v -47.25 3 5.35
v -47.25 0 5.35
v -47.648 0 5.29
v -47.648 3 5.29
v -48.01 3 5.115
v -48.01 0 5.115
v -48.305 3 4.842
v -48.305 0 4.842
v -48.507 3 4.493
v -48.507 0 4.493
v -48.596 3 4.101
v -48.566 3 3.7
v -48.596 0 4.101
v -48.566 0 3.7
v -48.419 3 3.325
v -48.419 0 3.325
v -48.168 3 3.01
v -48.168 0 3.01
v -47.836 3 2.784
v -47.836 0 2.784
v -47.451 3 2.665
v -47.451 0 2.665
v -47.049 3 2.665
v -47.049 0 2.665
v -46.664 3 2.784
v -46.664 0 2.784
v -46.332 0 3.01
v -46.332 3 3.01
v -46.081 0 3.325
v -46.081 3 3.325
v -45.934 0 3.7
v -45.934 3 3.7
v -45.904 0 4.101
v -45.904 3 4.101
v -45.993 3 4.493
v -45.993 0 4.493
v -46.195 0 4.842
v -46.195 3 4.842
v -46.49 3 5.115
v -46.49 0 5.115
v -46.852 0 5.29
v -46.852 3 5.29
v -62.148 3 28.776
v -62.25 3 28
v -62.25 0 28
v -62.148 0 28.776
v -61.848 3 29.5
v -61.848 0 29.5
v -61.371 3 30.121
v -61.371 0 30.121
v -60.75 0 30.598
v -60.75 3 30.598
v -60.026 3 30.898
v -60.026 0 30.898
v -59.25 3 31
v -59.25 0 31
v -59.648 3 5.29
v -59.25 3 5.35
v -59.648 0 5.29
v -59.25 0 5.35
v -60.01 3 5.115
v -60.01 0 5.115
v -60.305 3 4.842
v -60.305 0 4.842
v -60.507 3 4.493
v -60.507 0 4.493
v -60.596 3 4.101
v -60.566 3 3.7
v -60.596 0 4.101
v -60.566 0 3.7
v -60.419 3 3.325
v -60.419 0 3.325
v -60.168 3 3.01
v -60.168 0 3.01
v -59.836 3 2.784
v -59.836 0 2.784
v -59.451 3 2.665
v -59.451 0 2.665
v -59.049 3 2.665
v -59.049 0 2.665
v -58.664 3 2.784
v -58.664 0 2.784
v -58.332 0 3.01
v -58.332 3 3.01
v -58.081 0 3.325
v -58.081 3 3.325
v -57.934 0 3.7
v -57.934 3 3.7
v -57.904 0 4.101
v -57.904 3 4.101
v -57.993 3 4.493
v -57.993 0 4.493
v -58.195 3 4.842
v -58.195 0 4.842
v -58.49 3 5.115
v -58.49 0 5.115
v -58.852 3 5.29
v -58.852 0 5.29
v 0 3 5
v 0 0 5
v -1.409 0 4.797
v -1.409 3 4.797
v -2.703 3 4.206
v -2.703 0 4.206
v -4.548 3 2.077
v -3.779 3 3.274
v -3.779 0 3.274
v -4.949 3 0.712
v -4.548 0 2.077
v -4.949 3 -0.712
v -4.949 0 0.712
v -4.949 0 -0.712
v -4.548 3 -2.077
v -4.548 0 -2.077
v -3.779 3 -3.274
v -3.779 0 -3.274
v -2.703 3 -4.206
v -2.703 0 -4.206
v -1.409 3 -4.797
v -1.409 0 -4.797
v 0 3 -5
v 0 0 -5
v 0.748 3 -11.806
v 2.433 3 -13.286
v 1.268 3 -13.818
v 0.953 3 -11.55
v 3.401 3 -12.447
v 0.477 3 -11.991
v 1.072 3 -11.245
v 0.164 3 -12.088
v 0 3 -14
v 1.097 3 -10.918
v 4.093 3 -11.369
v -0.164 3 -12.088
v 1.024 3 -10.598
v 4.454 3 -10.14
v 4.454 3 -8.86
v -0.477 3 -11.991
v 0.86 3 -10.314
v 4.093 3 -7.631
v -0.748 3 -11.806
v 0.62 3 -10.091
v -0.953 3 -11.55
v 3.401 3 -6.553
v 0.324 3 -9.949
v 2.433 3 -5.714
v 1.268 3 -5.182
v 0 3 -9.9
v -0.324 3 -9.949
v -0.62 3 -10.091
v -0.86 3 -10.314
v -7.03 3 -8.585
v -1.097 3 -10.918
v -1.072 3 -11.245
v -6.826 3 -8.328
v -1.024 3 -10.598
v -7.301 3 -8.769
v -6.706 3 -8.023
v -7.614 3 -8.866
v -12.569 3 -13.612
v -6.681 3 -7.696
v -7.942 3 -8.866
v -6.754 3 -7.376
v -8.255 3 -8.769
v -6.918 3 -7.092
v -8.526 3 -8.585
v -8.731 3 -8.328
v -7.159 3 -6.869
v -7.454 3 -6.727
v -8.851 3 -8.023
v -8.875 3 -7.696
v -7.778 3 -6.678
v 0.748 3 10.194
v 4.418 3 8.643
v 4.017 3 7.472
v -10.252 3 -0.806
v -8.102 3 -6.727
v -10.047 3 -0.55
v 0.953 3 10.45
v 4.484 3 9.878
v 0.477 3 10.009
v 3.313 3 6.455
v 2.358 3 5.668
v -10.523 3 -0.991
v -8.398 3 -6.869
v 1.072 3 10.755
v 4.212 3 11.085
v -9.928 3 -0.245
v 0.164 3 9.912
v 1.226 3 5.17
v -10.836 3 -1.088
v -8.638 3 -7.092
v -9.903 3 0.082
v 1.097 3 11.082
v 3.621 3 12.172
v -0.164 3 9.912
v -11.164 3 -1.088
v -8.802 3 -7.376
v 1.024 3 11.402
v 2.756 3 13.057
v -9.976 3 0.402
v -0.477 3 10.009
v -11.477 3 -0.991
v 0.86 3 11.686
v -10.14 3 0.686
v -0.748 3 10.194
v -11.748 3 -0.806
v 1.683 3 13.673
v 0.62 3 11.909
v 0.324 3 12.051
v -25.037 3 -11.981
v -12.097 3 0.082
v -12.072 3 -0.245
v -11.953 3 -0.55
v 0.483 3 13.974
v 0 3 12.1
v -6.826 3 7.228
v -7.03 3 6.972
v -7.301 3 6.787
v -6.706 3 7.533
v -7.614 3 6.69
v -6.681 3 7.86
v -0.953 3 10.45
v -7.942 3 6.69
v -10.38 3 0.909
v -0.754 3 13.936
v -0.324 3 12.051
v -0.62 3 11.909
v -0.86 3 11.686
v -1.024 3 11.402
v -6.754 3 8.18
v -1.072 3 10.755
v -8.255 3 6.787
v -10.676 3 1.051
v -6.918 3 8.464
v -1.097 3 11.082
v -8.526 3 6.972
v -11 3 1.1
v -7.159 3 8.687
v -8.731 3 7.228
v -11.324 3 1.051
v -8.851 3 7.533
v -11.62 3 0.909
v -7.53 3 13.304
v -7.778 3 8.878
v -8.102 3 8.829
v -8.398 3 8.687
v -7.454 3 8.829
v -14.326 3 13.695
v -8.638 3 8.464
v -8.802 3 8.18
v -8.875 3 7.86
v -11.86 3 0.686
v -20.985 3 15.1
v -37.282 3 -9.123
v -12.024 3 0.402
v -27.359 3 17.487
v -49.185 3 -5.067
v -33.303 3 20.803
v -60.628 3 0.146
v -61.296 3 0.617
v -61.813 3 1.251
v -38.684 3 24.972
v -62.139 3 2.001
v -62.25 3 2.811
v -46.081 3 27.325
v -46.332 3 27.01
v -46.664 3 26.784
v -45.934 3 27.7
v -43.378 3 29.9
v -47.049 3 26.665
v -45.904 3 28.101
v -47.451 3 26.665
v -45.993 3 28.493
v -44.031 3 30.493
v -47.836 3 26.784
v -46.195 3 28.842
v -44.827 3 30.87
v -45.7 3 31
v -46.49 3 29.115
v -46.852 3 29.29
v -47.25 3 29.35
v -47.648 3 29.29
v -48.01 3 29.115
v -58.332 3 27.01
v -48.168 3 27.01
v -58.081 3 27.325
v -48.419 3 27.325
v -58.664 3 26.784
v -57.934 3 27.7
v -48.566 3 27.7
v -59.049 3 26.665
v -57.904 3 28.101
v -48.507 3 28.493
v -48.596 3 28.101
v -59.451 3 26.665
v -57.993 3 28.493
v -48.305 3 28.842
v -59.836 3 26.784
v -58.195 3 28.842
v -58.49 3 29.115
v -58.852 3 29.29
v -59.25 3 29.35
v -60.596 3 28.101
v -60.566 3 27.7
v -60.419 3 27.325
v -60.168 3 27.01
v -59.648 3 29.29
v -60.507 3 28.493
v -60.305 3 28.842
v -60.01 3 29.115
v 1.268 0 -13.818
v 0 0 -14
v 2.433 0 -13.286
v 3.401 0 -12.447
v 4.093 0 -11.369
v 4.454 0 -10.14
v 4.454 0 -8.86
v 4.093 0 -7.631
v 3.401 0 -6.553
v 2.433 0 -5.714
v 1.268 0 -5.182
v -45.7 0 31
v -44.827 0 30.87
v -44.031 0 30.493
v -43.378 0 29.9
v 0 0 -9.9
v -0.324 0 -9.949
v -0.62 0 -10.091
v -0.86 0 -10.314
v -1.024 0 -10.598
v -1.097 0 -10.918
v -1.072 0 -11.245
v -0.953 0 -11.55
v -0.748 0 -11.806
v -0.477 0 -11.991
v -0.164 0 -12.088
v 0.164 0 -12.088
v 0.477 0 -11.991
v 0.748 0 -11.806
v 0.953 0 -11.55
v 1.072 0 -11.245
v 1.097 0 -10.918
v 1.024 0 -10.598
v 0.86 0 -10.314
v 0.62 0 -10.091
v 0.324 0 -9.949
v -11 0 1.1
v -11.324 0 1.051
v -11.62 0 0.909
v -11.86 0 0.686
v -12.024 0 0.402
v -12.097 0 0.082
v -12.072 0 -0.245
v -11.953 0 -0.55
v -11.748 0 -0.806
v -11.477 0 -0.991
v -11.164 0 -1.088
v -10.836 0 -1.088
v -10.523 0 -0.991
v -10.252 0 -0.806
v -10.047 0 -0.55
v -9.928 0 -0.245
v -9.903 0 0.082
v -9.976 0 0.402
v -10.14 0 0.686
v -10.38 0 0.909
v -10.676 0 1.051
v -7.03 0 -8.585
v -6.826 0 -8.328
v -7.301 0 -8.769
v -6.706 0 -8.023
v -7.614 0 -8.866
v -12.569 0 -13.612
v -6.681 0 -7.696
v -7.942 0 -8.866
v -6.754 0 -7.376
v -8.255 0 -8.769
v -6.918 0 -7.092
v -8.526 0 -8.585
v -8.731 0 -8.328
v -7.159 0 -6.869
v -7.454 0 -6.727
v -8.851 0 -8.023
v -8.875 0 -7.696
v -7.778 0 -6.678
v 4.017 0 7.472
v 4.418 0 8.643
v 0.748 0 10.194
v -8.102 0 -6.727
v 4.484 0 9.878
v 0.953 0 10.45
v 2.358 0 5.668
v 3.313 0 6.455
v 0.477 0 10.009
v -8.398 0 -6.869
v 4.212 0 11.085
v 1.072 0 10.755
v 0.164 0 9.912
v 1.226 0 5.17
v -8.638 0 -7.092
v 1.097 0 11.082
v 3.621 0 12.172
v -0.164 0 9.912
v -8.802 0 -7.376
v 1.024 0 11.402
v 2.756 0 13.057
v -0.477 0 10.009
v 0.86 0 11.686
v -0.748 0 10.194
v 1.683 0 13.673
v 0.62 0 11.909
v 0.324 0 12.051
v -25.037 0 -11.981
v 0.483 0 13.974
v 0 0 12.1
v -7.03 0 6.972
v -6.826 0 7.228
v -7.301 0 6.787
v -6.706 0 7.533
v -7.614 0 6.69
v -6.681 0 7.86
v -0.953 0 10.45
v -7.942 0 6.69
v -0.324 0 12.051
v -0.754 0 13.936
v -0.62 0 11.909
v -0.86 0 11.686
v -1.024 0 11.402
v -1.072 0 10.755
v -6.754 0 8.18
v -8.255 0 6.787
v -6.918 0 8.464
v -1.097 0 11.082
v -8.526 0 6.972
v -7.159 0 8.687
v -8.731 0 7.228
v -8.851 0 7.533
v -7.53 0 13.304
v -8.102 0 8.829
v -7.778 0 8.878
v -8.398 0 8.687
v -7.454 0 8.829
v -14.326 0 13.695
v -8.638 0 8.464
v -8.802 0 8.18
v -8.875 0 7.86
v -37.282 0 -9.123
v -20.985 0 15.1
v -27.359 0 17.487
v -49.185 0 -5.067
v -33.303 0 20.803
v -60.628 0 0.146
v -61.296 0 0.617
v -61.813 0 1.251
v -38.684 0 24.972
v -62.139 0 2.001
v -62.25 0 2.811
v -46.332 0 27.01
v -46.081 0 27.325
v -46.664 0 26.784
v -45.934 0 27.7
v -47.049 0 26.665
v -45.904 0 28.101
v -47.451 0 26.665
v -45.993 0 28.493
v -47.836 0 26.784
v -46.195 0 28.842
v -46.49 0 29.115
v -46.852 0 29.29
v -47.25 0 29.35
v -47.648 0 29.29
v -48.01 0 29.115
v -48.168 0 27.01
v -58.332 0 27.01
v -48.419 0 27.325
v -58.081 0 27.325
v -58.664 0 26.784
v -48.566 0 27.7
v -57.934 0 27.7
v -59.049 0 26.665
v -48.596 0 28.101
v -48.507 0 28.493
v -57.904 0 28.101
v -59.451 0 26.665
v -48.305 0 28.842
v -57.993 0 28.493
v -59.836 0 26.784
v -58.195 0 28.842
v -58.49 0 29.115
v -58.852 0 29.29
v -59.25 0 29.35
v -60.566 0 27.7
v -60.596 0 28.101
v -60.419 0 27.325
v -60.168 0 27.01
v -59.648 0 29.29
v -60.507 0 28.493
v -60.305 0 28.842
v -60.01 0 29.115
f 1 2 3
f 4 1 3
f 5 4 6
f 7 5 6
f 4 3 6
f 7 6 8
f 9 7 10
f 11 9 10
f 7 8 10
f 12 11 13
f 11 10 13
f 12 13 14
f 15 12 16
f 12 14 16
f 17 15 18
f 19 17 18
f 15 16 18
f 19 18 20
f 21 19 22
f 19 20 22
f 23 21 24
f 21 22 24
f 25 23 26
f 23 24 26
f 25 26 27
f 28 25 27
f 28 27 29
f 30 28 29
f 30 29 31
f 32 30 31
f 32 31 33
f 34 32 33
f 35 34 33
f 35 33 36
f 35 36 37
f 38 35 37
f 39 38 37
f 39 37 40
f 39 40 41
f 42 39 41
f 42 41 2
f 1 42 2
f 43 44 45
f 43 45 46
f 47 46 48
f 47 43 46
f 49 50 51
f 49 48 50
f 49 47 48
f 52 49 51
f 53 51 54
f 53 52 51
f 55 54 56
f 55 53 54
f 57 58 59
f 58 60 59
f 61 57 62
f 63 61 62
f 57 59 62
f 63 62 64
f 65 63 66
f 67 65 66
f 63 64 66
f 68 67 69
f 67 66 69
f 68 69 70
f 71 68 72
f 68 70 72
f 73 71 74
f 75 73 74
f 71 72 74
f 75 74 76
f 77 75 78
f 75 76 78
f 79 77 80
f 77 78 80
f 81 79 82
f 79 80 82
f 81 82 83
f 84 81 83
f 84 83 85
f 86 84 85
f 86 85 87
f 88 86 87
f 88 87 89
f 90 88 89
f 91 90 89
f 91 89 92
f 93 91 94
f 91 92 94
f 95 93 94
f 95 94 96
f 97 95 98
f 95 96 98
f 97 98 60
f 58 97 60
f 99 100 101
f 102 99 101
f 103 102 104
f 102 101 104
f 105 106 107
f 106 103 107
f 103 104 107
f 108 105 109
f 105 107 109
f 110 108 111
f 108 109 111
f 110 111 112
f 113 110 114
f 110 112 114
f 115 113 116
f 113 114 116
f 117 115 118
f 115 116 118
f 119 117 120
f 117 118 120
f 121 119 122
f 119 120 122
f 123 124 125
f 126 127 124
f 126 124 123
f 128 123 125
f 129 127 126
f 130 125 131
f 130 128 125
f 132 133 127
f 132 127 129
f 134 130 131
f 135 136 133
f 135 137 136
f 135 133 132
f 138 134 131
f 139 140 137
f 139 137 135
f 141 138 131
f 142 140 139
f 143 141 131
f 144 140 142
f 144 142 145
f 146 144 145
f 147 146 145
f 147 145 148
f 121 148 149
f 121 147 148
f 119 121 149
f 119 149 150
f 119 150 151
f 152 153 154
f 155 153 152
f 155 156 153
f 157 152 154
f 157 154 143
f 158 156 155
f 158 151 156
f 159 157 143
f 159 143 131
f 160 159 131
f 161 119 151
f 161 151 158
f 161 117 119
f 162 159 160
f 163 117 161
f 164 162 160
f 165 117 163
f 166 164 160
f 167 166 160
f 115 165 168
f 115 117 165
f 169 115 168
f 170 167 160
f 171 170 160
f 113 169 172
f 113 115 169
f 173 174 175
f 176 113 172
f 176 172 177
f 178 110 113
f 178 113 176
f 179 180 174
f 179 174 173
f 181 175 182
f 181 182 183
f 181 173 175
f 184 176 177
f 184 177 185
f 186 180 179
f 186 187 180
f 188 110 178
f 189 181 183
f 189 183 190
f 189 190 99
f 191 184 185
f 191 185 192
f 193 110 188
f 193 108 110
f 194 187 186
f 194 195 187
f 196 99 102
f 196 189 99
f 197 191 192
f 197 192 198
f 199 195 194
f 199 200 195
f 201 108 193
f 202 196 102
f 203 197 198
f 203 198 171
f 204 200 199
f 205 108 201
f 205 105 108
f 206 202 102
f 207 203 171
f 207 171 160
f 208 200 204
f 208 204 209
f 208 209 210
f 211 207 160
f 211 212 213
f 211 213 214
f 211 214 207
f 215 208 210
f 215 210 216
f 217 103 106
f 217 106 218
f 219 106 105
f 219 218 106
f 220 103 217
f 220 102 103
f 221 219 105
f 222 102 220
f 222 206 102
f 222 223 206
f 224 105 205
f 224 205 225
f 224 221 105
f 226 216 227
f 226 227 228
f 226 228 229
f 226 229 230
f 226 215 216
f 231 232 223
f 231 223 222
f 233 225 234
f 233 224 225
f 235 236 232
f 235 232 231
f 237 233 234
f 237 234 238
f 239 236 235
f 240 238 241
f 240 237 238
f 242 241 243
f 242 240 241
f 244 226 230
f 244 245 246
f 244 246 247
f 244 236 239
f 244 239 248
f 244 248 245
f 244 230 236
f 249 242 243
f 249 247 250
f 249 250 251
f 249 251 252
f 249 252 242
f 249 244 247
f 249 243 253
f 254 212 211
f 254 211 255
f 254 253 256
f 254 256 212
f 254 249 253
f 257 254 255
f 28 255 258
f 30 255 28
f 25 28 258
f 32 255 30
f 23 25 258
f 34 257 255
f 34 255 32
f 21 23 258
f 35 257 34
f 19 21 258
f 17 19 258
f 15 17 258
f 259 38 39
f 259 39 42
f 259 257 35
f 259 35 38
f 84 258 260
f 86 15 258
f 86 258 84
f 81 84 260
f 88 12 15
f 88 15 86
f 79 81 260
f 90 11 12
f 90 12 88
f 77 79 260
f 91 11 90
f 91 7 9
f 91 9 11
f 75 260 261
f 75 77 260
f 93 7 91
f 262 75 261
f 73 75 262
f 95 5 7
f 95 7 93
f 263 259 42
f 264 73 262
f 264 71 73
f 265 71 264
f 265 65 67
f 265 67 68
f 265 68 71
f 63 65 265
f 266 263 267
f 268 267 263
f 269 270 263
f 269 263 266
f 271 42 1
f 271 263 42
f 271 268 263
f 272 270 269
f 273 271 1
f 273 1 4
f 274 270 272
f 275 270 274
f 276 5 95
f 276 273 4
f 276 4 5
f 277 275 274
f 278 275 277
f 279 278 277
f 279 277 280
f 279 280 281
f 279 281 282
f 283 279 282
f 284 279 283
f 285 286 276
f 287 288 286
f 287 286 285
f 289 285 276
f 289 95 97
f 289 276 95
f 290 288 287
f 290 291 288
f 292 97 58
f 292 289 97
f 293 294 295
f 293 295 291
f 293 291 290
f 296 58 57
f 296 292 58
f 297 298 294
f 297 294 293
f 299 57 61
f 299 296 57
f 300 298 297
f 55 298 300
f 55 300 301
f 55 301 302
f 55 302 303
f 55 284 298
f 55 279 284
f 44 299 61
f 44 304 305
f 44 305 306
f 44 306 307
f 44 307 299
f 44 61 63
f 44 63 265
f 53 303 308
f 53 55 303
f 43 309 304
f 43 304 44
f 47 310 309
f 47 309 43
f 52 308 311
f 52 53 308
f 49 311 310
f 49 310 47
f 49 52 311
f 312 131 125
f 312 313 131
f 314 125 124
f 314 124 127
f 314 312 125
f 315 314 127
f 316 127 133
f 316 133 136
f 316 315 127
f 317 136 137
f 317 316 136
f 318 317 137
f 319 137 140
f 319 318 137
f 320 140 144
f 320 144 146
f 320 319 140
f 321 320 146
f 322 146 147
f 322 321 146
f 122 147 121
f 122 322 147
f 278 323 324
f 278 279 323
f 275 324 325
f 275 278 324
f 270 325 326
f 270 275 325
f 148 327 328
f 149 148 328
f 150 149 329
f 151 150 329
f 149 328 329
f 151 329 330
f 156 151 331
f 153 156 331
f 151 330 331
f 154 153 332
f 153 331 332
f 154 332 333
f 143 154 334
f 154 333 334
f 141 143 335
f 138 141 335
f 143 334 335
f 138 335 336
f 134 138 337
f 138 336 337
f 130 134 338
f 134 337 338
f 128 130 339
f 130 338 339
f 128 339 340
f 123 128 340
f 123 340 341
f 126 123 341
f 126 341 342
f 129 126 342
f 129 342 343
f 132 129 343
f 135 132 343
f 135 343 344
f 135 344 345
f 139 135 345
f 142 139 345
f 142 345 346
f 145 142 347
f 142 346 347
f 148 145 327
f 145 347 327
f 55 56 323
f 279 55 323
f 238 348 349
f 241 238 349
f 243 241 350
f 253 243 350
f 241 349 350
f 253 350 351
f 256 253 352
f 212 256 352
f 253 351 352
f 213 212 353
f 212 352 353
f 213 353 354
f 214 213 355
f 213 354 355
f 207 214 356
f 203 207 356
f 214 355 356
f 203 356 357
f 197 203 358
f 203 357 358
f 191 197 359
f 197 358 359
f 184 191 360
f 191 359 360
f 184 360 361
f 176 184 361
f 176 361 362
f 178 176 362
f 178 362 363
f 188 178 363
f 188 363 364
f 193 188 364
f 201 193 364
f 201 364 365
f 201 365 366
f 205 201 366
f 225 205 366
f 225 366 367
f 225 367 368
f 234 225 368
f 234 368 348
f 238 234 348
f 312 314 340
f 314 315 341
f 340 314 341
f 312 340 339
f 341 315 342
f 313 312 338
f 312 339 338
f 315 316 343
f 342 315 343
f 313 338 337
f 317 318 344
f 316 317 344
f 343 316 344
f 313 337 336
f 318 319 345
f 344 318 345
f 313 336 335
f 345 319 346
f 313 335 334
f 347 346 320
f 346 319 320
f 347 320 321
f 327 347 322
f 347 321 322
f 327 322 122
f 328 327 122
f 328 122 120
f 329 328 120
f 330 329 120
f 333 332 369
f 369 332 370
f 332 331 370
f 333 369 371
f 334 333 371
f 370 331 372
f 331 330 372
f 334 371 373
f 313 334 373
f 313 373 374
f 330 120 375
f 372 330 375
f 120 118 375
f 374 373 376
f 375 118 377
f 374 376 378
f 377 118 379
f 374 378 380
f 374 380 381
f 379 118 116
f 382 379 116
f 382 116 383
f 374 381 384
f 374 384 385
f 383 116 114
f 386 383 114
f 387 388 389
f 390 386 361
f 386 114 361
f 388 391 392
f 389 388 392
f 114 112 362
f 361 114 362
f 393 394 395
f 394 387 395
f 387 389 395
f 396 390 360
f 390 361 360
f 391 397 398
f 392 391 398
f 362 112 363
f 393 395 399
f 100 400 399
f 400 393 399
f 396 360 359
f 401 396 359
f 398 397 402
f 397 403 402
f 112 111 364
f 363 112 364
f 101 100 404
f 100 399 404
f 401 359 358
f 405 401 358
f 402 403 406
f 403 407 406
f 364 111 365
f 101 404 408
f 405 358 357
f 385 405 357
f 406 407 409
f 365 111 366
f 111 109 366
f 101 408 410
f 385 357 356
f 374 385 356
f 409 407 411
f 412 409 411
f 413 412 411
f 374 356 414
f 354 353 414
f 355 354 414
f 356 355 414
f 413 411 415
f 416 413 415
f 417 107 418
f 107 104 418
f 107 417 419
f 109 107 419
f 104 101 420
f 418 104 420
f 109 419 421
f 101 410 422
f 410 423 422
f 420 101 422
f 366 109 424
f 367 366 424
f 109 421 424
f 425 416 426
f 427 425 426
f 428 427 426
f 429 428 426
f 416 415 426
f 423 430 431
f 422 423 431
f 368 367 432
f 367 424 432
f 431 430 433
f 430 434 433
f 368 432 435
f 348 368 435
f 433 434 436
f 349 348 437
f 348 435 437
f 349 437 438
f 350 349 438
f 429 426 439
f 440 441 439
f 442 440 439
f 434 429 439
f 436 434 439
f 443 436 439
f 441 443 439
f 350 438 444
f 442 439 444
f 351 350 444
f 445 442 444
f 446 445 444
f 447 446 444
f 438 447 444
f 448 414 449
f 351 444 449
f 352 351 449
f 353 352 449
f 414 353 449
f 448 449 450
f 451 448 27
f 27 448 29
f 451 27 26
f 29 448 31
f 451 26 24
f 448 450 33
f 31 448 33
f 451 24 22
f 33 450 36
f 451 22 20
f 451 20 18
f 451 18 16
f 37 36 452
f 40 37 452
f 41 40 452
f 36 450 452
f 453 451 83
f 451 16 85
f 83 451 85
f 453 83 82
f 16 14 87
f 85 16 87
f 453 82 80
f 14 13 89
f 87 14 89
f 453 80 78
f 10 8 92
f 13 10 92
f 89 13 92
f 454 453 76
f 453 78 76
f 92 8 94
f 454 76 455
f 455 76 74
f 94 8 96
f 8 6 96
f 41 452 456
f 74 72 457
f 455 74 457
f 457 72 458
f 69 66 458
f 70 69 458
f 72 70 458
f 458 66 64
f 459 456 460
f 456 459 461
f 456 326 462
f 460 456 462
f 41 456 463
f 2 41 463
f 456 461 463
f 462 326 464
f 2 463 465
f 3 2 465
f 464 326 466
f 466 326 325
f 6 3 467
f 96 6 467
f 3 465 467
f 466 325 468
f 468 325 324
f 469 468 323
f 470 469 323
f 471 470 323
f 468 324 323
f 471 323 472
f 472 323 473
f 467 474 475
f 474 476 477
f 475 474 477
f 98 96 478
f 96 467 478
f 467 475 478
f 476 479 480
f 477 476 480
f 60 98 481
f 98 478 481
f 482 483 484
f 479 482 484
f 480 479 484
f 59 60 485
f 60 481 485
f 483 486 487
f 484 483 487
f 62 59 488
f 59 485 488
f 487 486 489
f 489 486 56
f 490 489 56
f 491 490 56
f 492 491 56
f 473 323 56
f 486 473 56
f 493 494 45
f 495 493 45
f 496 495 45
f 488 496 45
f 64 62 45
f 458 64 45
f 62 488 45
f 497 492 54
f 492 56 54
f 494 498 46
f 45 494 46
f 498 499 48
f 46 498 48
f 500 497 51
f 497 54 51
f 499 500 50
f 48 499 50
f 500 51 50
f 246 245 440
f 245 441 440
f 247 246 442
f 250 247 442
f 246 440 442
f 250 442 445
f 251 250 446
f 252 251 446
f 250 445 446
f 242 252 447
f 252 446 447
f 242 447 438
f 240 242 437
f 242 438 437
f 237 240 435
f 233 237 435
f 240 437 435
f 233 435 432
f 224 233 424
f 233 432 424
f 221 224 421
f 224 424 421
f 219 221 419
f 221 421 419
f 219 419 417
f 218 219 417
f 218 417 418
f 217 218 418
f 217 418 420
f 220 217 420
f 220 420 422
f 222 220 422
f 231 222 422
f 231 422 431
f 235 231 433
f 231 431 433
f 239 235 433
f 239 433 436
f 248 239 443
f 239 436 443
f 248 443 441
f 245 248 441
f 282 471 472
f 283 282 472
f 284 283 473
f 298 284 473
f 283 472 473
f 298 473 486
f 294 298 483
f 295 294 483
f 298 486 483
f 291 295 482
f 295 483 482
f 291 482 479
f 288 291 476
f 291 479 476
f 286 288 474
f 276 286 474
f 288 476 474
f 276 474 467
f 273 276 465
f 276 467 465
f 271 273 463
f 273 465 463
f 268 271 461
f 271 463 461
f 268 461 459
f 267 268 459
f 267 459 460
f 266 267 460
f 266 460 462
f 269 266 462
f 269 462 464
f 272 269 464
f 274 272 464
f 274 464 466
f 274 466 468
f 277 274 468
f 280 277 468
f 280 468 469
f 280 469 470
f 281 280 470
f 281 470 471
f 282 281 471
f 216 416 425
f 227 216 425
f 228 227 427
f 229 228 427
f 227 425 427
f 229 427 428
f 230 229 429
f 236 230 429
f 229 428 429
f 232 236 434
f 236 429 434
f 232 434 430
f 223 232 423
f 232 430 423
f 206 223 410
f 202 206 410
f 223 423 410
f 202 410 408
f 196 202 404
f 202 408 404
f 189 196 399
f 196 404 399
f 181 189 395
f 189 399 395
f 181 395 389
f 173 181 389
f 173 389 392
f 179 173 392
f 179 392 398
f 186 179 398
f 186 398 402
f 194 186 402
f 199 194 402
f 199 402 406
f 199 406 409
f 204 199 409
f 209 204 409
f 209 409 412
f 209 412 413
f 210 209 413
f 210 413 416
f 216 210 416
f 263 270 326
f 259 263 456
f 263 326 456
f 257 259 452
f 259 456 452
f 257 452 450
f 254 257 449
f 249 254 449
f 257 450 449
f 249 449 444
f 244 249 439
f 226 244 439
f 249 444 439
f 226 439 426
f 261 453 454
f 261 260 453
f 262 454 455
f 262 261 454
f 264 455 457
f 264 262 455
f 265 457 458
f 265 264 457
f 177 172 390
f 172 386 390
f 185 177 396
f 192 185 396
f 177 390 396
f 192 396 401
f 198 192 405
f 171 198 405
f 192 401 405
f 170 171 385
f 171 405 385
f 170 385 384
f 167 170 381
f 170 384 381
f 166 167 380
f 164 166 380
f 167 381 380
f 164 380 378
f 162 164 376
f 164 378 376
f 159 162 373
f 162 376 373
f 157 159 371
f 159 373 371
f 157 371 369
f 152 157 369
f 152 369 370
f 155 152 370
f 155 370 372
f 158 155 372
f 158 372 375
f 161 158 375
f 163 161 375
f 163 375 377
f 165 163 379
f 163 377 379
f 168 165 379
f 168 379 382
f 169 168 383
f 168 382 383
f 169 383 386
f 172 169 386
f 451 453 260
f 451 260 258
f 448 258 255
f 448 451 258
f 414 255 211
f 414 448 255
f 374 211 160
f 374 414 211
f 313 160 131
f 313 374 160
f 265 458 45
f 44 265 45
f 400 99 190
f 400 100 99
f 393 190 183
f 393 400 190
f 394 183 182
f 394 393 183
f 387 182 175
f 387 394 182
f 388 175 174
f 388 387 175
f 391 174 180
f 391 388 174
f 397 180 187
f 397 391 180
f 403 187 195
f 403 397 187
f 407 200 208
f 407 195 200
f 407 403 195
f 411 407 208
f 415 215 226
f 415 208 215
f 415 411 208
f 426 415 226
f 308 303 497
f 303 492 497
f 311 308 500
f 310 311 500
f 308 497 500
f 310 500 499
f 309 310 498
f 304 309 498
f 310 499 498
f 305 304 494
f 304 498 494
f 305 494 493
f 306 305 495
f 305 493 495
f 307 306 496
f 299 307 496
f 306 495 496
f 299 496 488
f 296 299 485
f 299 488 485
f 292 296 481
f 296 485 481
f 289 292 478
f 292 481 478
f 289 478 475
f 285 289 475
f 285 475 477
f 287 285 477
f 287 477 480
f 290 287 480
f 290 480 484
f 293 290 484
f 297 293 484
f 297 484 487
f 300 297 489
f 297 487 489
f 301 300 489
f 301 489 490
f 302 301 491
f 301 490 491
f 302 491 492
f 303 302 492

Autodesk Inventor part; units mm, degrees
ref_plane "YZ Plane" through (0, 0, 0) normal (1, 0, 0) x (0, 1, 0)
ref_plane "XZ Plane" through (0, 0, 0) normal (0, 1, 0) x (-1, 0, 0)
ref_plane "XY Plane" through (0, 0, 0) normal (0, 0, 1) x (1, 0, 0)
sketch "スケッチ1" plane through (0, 0, 0) normal (0, 1, 0) x (-1, 0, 0)
  circle A0 centre (0, 0) radius 5
  circle A1 centre (0, 0) radius 11
  line L0 (0, 0) -> (0, -11)
  line L1 (0, 0) -> (0, 11)
  circle A2 centre (0, 9.5) radius 4.5
  circle A3 centre (0, -9.5) radius 4.5
  circle A4 centre (2.3645, 112.8492) radius 126.872
  circle A5 centre (8.3362, 58.5776) radius 45.2805
  circle A6 centre (2.3645, 112.8492) radius 54.5992
  line L2 (62.25, 31) -> (44.25, 31)
  line L3 (44.25, 31) -> (44.25, 1)
  line L4 (44.25, 1) -> (62.25, 1)
  line L5 (62.25, 1) -> (62.25, 31)
  line L6 (0, 0) -> (13.75, 0)
  line L7 (13.75, 0) -> (13.75, -16.75)
  line L8 (13.75, -16.75) -> (0, -16.75)
  line L9 (0, -16.75) -> (0, 0)
  line L10 (70.25, 35.25) -> (36.25, 35.25)
  line L11 (36.25, 35.25) -> (36.25, -11.25)
  line L12 (36.25, -11.25) -> (70.25, -11.25)
  line L13 (70.25, -11.25) -> (70.25, 35.25)
  line L14 (70.25, 0) -> (36.25, 0)
  line L15 (0, 0) -> (36.25, 0)
  point P0 (62.25, 1)
  point P1 (0.7536, 13.9365)
  point P2 (0, 5)
  point P3 (0, -5)
  point P4 (-0.087, -13.9992)
  dimension "d4" = 253.744
  dimension "d5" = 90.561
  dimension "d0" = 10
  dimension "d1" = 22
  dimension "d2" = 9
  dimension "d3" = 9
  dimension "d7" = 18
  dimension "d8" = 30
  dimension "d9" = 13.75
  dimension "d10" = 16.75
  dimension "d11" = 46.5
  dimension "d12" = 4.25
  dimension "d13" = 8
  dimension "d14" = 34
  dimension "d15" = 11.25
  dimension "d16" = 70.25
extrude "押し出し1" add sketch "スケッチ1" along normal blind 3 contours L6 A1 A3 A0 | A0 A2 A1 L6 | A2 A1 L1 | L1 A1 A2 | A3 A1 L0 | L0 A1 A3 | L6 L7 A4 A3 A1 | A1 A2 A5 L11 L15 L6 | A1 A2 | L9 A3 A1 | A1 A3 L9 | L15 L11 A4 L7 | L14 A4 L11 | L11 A5 L3 L4 A4 L14 | L2 L5 L4 L3
fillet "フィレット1" radius 3 3 edges at (-62.25, 1.5, 1) (-62.25, 1.5, 31) (-44.25, 1.5, 31)
sketch "スケッチ4" plane through (0, 3, 0) normal (0, 1, 0) x (1, 0, 0)
  arc A0 (0, 5) -> (0.087, 13.9992) centre (0, 9.5) ccw projected
  arc A1 (-0.7536, -13.9365) -> (0, -5) centre (0, -9.5) ccw projected
  arc A2 (0, 5) -> (0, -5) centre (0, 0) ccw projected
  circle A3 centre (0, 0) radius 11
  point P0 (0, 11)
  point P1 (0, -11)
  point P2 (-7.7782, -7.7782)
  point P3 (-11, 0)
  point P4 (-7.7782, 7.7782)
  point P5 (0, 11)
  dimension "d29" = 22
  dimension "d56" = 180
hole "穴1" at (0, 3, -11) at (0, 3, 11) at (-7.7782, 3, 7.7782) at (-11, 3, 0) at (-7.7782, 3, -7.7782) direction (0, -1, 0) diameter 2.2 end through all
sketch "スケッチ5" plane through (0, 3, 0) normal (0, 1, 0) x (1, 0, 0)
  line L0 (-59.25, -4) -> (-47.25, -4)
  line L1 (-47.25, -4) -> (-47.25, -28)
  line L2 (-47.25, -28) -> (-59.25, -28)
  line L3 (-59.25, -28) -> (-59.25, -4)
  line L4 (-62.25, -2.8114) -> (-62.25, -28) projected
  line L5 (-59.25, -31) -> (-45.6995, -31) projected
  point P0 (0, 0)
  dimension "d37" = 3
  dimension "d38" = 3
  dimension "d39" = 12
  dimension "d40" = 24
hole "穴2" at (-59.25, 3, 28) at (-47.25, 3, 28) at (-47.25, 3, 4) at (-59.25, 3, 4) direction (0, -1, 0) diameter 2.7 end through all
properties part number "connectpart4" material "アルミニウム 6061"
